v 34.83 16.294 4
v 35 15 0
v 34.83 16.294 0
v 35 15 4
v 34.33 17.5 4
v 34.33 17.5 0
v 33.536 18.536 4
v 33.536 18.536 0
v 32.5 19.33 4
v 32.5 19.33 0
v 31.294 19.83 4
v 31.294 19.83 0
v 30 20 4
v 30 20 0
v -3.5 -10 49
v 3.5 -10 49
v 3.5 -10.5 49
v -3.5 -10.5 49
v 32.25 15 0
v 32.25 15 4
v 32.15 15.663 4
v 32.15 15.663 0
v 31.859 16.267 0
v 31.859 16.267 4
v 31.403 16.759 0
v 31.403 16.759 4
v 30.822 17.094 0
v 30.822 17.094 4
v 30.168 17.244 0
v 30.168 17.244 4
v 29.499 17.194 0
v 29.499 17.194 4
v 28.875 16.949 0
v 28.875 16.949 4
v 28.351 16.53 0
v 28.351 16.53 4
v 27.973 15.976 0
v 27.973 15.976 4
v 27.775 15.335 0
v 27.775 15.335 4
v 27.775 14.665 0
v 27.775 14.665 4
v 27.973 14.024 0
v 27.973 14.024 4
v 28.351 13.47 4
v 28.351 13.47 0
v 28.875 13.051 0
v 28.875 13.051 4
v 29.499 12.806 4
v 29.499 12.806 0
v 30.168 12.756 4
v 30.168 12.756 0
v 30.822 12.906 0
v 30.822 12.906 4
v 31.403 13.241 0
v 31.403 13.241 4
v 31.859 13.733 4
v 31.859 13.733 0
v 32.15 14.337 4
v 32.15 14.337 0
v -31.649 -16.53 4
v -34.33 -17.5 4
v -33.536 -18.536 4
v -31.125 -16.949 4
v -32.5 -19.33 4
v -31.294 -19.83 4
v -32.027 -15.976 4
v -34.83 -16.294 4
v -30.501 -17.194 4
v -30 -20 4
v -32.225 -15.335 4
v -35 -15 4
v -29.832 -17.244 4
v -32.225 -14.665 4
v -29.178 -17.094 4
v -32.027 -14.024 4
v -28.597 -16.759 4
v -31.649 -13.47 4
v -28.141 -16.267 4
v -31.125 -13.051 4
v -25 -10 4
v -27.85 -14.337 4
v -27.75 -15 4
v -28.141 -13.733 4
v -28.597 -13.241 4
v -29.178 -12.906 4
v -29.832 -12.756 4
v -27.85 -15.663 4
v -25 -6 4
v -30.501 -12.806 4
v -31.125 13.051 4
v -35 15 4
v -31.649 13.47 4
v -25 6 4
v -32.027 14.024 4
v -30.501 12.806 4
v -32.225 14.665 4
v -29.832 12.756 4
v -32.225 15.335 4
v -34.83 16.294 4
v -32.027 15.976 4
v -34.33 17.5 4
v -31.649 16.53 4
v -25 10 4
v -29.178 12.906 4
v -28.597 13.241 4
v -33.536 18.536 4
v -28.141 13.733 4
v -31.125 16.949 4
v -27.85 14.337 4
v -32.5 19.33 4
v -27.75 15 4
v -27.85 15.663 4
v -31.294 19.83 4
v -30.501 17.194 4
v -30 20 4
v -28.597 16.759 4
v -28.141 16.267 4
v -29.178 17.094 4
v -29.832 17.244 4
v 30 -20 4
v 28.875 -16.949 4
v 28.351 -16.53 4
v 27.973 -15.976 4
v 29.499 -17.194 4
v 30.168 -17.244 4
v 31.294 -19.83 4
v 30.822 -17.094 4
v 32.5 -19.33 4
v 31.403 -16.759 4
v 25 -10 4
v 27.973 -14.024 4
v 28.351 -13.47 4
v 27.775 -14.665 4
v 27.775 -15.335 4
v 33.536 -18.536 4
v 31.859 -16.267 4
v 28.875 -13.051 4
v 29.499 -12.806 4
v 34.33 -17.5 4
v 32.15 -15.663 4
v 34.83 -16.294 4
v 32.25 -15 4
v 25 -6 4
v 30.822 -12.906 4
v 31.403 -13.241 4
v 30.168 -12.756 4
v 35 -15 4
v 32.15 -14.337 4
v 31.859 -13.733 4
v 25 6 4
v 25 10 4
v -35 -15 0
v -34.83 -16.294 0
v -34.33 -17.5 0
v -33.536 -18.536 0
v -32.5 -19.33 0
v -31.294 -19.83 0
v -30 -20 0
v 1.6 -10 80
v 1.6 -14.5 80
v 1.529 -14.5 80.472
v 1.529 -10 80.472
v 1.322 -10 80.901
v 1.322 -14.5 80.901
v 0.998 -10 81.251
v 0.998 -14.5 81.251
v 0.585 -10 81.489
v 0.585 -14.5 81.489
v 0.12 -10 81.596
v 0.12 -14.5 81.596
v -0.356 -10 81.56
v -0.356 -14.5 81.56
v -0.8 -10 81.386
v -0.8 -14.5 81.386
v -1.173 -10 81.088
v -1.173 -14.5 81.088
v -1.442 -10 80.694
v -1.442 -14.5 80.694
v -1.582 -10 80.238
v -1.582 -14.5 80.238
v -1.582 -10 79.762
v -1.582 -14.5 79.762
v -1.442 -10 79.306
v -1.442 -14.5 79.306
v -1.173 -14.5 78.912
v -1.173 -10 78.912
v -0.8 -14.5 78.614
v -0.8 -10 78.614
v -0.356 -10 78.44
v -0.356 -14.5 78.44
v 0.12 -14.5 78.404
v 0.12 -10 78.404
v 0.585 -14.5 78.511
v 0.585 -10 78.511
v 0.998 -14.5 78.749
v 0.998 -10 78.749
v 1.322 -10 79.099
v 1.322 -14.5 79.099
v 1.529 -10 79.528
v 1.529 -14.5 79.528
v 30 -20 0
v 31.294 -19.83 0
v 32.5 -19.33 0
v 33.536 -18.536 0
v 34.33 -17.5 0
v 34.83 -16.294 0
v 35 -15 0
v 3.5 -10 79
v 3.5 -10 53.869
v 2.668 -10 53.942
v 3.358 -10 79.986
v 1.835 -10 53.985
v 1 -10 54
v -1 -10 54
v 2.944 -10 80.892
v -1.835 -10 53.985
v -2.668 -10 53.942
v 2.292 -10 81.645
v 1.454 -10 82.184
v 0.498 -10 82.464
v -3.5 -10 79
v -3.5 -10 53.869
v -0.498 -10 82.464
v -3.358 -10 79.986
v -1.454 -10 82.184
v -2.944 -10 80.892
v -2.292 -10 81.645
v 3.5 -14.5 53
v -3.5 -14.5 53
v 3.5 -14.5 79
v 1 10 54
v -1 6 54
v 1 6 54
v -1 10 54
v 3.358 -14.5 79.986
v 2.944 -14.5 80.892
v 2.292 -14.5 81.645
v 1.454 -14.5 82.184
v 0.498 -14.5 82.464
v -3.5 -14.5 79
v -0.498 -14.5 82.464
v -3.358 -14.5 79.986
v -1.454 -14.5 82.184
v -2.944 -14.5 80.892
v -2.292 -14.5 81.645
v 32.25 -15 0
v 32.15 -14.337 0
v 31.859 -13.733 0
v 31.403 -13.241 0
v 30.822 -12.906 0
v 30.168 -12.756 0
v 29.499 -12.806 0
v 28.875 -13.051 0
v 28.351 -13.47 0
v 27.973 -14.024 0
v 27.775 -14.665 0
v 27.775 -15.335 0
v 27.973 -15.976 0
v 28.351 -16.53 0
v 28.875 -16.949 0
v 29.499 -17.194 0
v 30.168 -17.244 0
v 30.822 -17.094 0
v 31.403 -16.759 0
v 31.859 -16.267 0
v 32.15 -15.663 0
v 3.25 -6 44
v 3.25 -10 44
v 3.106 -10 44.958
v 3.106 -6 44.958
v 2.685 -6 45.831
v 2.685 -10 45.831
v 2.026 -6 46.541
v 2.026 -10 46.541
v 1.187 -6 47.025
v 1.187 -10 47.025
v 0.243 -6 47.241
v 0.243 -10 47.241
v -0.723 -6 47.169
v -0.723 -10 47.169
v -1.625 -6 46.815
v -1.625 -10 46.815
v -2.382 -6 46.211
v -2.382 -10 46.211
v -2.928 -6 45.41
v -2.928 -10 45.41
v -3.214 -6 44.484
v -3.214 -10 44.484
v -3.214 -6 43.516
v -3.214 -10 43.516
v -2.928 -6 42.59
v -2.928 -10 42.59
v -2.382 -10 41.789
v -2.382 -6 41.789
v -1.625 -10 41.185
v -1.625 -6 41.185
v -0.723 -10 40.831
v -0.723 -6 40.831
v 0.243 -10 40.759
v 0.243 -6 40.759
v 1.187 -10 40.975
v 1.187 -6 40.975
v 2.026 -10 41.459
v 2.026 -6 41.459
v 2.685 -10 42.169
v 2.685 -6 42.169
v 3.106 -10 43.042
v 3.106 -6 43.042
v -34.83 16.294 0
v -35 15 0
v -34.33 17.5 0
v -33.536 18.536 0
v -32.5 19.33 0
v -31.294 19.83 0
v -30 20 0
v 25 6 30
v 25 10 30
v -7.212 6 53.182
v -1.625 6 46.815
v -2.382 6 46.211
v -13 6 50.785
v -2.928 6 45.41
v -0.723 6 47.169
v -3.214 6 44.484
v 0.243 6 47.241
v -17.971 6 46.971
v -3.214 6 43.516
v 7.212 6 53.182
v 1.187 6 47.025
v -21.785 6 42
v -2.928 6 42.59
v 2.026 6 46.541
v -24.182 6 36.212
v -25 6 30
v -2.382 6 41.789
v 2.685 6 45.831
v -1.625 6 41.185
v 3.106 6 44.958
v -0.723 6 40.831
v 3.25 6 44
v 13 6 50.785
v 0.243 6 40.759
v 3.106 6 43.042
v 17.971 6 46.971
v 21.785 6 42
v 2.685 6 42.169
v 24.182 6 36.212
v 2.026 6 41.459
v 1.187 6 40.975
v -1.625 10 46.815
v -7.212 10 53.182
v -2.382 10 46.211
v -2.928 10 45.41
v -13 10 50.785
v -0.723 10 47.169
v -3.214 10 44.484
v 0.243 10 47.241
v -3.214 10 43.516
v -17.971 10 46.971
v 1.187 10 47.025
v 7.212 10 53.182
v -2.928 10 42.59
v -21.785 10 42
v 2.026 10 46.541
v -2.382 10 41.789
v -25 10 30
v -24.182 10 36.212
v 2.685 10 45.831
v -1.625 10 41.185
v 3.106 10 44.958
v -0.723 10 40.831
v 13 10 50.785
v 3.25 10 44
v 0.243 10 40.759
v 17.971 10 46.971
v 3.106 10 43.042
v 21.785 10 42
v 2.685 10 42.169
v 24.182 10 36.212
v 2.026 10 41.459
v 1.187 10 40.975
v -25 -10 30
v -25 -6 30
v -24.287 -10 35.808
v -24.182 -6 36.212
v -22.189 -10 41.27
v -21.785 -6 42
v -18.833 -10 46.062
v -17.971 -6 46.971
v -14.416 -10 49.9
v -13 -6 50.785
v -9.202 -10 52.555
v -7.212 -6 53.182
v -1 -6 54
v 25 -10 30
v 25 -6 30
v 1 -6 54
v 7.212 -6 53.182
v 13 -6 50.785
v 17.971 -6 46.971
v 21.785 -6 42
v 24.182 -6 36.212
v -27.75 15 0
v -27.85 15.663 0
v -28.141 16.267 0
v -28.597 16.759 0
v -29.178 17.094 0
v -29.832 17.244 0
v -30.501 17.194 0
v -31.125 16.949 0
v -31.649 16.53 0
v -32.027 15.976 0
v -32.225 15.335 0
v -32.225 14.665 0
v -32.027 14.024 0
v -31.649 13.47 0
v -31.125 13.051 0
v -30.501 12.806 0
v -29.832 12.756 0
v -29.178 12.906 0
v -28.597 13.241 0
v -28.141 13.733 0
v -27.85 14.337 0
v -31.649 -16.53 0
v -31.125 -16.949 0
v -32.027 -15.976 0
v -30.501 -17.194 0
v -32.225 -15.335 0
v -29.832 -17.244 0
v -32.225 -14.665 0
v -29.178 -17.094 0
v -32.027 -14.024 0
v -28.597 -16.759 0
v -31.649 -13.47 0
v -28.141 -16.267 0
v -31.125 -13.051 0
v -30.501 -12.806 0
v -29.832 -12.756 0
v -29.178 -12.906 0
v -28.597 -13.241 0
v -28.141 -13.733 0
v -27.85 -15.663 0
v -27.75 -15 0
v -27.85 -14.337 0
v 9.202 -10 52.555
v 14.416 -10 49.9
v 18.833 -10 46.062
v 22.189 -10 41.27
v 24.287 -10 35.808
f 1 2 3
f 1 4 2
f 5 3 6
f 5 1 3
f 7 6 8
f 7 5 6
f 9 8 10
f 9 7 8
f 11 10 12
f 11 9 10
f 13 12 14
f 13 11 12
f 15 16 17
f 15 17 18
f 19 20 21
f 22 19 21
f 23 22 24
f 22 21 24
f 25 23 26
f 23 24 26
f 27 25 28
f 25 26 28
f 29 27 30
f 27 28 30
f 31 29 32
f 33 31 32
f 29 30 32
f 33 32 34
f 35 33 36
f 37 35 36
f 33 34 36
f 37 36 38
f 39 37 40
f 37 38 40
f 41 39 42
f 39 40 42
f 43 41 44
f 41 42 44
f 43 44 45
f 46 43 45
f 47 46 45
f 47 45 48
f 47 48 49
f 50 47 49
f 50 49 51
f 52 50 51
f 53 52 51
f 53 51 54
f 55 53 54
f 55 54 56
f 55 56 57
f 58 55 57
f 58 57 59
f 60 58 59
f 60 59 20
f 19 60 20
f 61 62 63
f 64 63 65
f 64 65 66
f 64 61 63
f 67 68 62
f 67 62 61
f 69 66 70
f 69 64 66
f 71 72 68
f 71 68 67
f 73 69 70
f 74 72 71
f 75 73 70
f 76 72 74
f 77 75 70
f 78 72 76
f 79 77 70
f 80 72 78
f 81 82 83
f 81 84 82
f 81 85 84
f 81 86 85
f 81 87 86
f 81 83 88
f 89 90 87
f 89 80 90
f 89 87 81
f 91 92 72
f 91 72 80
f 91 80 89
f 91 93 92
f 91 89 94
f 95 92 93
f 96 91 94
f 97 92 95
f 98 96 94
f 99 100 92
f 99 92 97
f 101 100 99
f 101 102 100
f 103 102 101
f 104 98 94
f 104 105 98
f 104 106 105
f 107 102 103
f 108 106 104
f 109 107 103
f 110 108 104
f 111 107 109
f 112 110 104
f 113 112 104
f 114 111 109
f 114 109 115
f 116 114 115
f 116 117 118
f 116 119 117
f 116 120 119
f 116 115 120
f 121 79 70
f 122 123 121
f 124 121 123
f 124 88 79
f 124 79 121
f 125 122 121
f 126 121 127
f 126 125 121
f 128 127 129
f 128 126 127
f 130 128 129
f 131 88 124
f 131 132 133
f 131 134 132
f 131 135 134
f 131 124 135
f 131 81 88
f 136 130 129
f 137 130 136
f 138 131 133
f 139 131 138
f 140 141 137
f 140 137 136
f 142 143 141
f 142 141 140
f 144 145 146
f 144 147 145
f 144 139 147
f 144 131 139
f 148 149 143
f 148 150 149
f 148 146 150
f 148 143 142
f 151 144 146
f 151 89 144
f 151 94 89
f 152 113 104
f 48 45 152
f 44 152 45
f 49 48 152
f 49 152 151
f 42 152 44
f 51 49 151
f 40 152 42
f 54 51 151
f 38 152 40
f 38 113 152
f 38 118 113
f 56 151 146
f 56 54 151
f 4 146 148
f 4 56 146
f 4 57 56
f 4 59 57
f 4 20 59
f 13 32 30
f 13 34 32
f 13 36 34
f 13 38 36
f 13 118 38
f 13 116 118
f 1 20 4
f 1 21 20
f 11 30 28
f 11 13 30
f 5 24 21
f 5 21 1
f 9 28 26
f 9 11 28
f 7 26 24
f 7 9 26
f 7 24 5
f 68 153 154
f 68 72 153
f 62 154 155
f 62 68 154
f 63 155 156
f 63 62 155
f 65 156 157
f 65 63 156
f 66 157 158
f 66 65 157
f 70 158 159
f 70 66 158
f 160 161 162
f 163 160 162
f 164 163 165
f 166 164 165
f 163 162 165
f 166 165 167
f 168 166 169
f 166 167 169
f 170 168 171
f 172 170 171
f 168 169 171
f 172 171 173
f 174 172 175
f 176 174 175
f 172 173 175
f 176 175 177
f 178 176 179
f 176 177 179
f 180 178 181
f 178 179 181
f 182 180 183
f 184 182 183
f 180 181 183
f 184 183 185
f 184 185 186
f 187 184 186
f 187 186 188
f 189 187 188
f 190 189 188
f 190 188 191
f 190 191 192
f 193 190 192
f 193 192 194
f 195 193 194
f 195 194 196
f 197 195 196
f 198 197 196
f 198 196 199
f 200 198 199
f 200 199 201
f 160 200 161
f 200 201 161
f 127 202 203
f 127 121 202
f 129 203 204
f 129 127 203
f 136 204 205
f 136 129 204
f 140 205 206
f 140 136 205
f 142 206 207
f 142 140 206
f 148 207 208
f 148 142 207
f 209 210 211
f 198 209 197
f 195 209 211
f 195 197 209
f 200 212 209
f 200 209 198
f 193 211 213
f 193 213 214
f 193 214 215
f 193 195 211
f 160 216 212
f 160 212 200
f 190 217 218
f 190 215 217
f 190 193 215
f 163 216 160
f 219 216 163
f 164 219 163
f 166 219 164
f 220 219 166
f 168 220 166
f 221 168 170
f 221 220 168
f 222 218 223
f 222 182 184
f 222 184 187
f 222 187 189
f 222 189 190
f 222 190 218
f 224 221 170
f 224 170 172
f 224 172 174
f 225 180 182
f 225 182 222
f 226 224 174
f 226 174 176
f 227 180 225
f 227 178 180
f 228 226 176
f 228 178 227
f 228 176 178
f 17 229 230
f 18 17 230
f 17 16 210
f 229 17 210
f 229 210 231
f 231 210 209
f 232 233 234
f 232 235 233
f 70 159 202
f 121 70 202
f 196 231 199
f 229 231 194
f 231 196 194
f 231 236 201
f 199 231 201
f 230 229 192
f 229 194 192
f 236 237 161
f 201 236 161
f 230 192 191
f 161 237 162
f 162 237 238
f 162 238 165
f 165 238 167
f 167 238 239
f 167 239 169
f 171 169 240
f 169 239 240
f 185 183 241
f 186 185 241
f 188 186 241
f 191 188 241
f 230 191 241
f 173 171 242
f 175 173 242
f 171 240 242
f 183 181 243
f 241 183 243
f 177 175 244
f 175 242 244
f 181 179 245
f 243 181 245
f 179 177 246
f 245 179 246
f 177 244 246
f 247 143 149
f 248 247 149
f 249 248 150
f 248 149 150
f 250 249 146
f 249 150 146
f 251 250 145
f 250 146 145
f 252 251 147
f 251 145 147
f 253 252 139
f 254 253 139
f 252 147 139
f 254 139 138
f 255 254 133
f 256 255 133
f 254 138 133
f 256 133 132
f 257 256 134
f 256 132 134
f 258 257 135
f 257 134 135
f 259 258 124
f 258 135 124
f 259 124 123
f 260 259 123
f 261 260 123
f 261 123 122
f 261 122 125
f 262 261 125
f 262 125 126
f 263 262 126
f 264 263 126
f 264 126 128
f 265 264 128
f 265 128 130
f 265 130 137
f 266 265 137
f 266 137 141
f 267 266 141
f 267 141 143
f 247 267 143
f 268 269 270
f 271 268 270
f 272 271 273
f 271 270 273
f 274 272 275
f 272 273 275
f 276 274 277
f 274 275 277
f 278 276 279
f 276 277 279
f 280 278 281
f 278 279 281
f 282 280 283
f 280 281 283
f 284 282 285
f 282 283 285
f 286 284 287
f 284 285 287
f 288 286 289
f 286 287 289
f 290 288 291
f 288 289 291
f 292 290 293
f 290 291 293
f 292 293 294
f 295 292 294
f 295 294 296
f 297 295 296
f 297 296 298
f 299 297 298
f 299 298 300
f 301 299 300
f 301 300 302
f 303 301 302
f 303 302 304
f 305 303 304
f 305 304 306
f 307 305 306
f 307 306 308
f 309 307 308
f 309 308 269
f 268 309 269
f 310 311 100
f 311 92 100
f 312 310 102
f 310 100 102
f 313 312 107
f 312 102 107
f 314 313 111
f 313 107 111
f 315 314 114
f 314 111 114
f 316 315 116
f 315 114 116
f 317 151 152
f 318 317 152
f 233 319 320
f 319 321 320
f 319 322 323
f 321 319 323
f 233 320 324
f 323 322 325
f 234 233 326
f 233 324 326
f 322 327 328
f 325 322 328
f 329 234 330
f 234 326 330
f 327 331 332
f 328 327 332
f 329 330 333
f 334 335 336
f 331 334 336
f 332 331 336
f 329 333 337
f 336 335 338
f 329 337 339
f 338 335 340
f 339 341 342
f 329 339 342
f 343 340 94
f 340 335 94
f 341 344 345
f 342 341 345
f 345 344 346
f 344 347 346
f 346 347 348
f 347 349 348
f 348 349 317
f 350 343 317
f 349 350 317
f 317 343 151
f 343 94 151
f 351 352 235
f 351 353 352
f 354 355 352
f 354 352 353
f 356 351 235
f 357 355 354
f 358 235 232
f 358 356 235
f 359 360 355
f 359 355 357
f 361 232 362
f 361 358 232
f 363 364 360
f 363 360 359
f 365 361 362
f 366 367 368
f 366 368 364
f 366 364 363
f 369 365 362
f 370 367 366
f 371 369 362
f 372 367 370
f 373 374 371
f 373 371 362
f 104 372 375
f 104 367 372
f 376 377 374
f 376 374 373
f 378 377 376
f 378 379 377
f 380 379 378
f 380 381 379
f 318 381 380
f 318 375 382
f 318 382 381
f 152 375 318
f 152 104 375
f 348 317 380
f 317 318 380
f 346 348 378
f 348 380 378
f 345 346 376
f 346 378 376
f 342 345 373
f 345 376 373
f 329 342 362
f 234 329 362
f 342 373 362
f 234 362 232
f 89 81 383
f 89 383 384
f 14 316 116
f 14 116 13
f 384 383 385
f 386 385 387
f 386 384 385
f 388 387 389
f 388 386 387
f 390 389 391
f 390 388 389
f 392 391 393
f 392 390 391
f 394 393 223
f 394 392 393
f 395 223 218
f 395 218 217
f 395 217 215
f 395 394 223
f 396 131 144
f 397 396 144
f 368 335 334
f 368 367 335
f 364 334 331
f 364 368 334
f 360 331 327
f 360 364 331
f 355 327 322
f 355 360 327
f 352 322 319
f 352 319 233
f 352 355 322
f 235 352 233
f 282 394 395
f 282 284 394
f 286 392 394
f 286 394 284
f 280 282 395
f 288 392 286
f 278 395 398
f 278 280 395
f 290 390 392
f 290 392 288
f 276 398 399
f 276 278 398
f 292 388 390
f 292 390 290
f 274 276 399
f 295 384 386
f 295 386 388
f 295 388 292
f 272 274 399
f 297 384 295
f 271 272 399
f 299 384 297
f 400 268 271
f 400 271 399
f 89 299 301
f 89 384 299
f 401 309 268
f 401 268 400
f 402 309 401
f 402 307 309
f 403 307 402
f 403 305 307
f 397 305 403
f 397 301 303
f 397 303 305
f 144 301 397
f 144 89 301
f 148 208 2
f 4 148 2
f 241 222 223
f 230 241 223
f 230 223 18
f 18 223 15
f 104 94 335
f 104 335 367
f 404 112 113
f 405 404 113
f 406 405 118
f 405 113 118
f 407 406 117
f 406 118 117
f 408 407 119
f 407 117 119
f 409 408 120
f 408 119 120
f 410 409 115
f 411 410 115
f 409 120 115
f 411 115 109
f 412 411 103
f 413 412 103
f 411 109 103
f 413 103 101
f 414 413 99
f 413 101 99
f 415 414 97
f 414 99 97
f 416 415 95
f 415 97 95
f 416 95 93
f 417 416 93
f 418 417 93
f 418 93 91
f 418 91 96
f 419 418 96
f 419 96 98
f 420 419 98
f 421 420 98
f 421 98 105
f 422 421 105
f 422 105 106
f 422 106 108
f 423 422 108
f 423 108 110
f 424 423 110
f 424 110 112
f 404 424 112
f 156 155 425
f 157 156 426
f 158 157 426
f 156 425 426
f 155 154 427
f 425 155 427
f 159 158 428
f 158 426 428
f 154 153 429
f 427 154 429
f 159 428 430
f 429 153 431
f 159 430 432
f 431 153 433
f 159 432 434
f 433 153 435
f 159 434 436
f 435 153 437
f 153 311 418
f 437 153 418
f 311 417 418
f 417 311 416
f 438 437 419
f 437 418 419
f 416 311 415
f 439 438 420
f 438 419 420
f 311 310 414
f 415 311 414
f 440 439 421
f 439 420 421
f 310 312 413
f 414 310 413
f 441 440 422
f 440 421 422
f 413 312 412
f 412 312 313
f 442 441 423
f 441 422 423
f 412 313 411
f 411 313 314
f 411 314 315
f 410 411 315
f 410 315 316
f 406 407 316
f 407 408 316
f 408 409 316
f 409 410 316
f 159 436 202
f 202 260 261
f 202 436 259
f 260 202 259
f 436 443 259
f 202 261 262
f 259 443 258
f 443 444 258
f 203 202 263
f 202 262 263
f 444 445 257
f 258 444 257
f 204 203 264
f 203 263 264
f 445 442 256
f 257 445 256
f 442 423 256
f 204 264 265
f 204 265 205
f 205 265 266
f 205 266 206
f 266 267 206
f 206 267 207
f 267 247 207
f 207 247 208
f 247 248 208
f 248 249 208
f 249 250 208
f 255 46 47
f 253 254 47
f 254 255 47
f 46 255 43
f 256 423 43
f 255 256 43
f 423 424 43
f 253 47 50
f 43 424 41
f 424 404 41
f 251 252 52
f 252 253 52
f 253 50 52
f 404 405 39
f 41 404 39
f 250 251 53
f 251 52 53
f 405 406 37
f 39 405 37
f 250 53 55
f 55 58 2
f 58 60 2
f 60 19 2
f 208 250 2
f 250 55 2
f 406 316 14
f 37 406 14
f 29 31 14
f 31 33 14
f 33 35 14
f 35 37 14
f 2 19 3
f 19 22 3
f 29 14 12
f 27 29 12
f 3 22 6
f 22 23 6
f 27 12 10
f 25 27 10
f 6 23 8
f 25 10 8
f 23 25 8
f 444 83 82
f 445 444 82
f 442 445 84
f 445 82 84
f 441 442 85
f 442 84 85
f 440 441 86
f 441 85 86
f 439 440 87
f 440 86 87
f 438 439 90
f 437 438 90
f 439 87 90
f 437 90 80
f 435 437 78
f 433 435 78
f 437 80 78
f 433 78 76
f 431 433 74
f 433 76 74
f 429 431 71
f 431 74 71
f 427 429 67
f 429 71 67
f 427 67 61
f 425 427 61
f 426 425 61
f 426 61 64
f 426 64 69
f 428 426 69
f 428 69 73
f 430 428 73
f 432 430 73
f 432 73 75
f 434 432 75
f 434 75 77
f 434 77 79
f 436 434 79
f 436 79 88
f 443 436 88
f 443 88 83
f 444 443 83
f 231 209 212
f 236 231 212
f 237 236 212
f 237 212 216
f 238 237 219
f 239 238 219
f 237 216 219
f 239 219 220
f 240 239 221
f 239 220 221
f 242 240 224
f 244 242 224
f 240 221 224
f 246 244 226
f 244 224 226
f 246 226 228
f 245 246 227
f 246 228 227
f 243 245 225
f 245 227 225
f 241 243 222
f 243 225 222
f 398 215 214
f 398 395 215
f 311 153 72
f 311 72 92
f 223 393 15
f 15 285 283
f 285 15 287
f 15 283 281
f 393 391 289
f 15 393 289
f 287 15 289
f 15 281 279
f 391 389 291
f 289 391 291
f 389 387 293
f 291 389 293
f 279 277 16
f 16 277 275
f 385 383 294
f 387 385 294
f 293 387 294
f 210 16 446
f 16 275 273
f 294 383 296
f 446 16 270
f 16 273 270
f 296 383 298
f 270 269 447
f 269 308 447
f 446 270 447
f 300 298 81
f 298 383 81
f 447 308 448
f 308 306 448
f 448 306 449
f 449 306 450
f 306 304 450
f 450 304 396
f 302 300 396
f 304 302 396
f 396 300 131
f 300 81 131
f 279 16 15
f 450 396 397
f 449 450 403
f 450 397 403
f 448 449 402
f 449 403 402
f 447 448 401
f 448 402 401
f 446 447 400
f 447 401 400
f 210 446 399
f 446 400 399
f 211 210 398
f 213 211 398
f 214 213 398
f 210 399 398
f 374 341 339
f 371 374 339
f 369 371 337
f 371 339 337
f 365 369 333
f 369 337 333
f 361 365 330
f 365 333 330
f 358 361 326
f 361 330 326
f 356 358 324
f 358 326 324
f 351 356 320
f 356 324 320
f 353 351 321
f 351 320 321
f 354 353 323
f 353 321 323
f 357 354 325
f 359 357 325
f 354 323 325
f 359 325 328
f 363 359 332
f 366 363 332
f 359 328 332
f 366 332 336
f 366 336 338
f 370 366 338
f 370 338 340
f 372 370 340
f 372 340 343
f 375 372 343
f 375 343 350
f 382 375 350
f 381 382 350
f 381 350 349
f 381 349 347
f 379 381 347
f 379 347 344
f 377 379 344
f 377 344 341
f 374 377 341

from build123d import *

# Parameters (mm, degrees)
SKETCH_W        = 70
SKETCH_H        = 40
PAD_DEPTH       = 4
FILLET_R        = 5
SKETCH001_R     = 2.25
POCKET_DEPTH    = 5
SKETCH002_W     = 50
SKETCH002_H     = 4
PAD001_DEPTH    = 50
SKETCH003_R     = 3.25
POCKET001_DEPTH = 30.001
FILLET001_R     = 24
PAD004_DEPTH    = 4.5
CHAMFER_SIZE    = 4
SKETCH007_R     = 1.6
POCKET002_DEPTH = 4.5


with BuildPart() as part:
    # Sketch → Pad (new body)
    with BuildSketch(Plane.XY):
        Rectangle(SKETCH_W, SKETCH_H)
    extrude(amount=PAD_DEPTH)

    # Fillet
    fillet_edges = [part.edges().sort_by_distance(p)[0] for p in [
        (35, -20, 2),
        (35, 20, 2),
        (-35, -20, 2),
        (-35, 20, 2),
    ]]
    fillet(fillet_edges, radius=FILLET_R)

    # Sketch001 (on Face5 of Fillet) → Pocket (cut)
    with BuildSketch(Plane.XY.offset(4)):
        with Locations((-30, 15)):
            Circle(SKETCH001_R)
        with Locations((30, 15)):
            Circle(SKETCH001_R)
        with Locations((30, -15)):
            Circle(SKETCH001_R)
        with Locations((-30, -15)):
            Circle(SKETCH001_R)
    extrude(amount=-POCKET_DEPTH, mode=Mode.SUBTRACT)

    # Sketch002 (on Face5 of Pocket) → Pad001 (join)
    with BuildSketch(Plane.XY.offset(4)):
        with Locations((0, 8)):
            Rectangle(SKETCH002_W, SKETCH002_H)
        with Locations((0, -8)):
            Rectangle(SKETCH002_W, SKETCH002_H)
    extrude(amount=PAD001_DEPTH)

    # Sketch003 (on Face21 of Pad001) → Pocket001 (cut, through all)
    with BuildSketch(Plane.XZ.offset(10)):
        with Locations((0, 44)):
            Circle(SKETCH003_R)
    extrude(amount=-POCKET001_DEPTH, mode=Mode.SUBTRACT)

    # Fillet001
    fillet001_edges = [part.edges().sort_by_distance(p)[0] for p in [
        (-25, 8, 54),
        (-25, -8, 54),
        (25, 8, 54),
        (25, -8, 54),
    ]]
    fillet(fillet001_edges, radius=FILLET001_R)

    # Sketch006 (on Face21 of Fillet001) → Pad004 (join)
    with BuildSketch(Plane.XZ.offset(10)):
        with BuildLine():
            Line((3.5, 49), (-3.5, 49))
            Line((-3.5, 79), (-3.5, 49))
            ThreePointArc((3.5, 79), (0, 82.5), (-3.5, 79))
            Line((3.5, 49), (3.5, 79))
        make_face()
    extrude(amount=PAD004_DEPTH)

    # Chamfer
    chamfer_edges = [part.edges().sort_by_distance(p)[0] for p in [
        (0, -14.5, 49),
    ]]
    chamfer(chamfer_edges, length=CHAMFER_SIZE)

    # Sketch007 (on Face5 of Chamfer) → Pocket002 (cut)
    with BuildSketch(Plane.XZ.offset(14.5)):
        with Locations((0, 80)):
            Circle(SKETCH007_R)
    extrude(amount=-POCKET002_DEPTH, mode=Mode.SUBTRACT)


solid = part.part
